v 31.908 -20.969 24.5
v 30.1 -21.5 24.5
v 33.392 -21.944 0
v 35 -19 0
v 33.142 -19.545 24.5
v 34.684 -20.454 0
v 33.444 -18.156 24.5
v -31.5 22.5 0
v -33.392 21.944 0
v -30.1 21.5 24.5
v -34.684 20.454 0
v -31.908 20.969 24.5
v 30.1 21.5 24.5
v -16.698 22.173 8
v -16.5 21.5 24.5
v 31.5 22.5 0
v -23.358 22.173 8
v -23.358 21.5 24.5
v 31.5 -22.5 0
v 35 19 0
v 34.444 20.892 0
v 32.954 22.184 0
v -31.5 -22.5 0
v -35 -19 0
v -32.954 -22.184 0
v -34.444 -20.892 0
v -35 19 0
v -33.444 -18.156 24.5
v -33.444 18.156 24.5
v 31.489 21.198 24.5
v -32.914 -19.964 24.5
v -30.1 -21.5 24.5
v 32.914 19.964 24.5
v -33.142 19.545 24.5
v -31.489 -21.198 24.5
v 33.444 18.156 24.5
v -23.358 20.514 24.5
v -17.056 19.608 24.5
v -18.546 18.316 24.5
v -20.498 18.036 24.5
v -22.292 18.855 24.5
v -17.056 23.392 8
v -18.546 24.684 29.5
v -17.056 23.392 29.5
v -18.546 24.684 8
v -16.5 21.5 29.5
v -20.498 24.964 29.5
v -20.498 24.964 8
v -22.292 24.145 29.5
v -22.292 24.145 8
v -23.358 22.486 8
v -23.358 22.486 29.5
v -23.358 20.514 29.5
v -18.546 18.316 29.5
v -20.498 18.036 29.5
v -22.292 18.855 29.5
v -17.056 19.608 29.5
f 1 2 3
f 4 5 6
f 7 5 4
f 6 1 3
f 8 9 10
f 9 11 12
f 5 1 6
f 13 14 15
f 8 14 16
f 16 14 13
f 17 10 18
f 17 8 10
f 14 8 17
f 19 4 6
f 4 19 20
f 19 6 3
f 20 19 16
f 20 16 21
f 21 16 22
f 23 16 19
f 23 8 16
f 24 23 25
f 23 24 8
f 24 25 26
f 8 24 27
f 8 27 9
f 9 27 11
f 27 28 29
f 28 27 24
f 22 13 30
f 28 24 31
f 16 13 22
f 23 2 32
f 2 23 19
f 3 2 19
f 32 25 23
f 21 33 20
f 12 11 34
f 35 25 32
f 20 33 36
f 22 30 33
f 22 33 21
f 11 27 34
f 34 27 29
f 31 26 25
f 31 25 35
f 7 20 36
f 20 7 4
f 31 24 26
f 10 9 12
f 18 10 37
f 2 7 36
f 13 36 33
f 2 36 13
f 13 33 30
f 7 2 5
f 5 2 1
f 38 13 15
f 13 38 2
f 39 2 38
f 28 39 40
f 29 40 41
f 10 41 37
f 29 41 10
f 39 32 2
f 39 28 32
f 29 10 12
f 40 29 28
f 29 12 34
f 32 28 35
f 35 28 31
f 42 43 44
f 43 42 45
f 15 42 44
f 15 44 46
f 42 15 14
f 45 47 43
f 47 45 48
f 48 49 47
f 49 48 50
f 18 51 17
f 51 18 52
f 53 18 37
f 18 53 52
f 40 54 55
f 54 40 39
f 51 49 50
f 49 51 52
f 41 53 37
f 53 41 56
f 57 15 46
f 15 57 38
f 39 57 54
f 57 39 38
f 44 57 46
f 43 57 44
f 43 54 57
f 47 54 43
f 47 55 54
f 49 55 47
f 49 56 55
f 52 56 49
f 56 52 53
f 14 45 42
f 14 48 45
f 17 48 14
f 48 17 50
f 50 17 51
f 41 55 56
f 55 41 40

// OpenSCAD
include <MCAD/units.scad>
use <MCAD/regular_shapes.scad>

insteon_inlinelinc_body();
insteon_inlinelinc_ground();

front_length=70*mm;
front_width=45*mm;
back_width=43*mm;
radius=3.5*mm;

function insteon_inlinelinc_depth() = 24.5*mm;

function insteon_inlinelinc_length() = front_length;

// Shape of Insteon In-LineLinc
module insteon_inlinelinc_body()
{
    linear_extrude(height=insteon_inlinelinc_depth(), scale=back_width/front_width)
    {
        offset(r=radius)
        {
            square([front_length-2*radius,front_width-2*radius], true);
        }
    }
}

module insteon_inlinelinc_ground()
{
    ground_length_offset=15*mm;
    ground_width=46.5*mm;
    ground_depth_offset=8*mm;
    translate([ground_length_offset-front_length/2,back_width/2,ground_depth_offset]) cylinder(r=(ground_width-back_width), h=insteon_inlinelinc_depth()-ground_depth_offset+5);
}
